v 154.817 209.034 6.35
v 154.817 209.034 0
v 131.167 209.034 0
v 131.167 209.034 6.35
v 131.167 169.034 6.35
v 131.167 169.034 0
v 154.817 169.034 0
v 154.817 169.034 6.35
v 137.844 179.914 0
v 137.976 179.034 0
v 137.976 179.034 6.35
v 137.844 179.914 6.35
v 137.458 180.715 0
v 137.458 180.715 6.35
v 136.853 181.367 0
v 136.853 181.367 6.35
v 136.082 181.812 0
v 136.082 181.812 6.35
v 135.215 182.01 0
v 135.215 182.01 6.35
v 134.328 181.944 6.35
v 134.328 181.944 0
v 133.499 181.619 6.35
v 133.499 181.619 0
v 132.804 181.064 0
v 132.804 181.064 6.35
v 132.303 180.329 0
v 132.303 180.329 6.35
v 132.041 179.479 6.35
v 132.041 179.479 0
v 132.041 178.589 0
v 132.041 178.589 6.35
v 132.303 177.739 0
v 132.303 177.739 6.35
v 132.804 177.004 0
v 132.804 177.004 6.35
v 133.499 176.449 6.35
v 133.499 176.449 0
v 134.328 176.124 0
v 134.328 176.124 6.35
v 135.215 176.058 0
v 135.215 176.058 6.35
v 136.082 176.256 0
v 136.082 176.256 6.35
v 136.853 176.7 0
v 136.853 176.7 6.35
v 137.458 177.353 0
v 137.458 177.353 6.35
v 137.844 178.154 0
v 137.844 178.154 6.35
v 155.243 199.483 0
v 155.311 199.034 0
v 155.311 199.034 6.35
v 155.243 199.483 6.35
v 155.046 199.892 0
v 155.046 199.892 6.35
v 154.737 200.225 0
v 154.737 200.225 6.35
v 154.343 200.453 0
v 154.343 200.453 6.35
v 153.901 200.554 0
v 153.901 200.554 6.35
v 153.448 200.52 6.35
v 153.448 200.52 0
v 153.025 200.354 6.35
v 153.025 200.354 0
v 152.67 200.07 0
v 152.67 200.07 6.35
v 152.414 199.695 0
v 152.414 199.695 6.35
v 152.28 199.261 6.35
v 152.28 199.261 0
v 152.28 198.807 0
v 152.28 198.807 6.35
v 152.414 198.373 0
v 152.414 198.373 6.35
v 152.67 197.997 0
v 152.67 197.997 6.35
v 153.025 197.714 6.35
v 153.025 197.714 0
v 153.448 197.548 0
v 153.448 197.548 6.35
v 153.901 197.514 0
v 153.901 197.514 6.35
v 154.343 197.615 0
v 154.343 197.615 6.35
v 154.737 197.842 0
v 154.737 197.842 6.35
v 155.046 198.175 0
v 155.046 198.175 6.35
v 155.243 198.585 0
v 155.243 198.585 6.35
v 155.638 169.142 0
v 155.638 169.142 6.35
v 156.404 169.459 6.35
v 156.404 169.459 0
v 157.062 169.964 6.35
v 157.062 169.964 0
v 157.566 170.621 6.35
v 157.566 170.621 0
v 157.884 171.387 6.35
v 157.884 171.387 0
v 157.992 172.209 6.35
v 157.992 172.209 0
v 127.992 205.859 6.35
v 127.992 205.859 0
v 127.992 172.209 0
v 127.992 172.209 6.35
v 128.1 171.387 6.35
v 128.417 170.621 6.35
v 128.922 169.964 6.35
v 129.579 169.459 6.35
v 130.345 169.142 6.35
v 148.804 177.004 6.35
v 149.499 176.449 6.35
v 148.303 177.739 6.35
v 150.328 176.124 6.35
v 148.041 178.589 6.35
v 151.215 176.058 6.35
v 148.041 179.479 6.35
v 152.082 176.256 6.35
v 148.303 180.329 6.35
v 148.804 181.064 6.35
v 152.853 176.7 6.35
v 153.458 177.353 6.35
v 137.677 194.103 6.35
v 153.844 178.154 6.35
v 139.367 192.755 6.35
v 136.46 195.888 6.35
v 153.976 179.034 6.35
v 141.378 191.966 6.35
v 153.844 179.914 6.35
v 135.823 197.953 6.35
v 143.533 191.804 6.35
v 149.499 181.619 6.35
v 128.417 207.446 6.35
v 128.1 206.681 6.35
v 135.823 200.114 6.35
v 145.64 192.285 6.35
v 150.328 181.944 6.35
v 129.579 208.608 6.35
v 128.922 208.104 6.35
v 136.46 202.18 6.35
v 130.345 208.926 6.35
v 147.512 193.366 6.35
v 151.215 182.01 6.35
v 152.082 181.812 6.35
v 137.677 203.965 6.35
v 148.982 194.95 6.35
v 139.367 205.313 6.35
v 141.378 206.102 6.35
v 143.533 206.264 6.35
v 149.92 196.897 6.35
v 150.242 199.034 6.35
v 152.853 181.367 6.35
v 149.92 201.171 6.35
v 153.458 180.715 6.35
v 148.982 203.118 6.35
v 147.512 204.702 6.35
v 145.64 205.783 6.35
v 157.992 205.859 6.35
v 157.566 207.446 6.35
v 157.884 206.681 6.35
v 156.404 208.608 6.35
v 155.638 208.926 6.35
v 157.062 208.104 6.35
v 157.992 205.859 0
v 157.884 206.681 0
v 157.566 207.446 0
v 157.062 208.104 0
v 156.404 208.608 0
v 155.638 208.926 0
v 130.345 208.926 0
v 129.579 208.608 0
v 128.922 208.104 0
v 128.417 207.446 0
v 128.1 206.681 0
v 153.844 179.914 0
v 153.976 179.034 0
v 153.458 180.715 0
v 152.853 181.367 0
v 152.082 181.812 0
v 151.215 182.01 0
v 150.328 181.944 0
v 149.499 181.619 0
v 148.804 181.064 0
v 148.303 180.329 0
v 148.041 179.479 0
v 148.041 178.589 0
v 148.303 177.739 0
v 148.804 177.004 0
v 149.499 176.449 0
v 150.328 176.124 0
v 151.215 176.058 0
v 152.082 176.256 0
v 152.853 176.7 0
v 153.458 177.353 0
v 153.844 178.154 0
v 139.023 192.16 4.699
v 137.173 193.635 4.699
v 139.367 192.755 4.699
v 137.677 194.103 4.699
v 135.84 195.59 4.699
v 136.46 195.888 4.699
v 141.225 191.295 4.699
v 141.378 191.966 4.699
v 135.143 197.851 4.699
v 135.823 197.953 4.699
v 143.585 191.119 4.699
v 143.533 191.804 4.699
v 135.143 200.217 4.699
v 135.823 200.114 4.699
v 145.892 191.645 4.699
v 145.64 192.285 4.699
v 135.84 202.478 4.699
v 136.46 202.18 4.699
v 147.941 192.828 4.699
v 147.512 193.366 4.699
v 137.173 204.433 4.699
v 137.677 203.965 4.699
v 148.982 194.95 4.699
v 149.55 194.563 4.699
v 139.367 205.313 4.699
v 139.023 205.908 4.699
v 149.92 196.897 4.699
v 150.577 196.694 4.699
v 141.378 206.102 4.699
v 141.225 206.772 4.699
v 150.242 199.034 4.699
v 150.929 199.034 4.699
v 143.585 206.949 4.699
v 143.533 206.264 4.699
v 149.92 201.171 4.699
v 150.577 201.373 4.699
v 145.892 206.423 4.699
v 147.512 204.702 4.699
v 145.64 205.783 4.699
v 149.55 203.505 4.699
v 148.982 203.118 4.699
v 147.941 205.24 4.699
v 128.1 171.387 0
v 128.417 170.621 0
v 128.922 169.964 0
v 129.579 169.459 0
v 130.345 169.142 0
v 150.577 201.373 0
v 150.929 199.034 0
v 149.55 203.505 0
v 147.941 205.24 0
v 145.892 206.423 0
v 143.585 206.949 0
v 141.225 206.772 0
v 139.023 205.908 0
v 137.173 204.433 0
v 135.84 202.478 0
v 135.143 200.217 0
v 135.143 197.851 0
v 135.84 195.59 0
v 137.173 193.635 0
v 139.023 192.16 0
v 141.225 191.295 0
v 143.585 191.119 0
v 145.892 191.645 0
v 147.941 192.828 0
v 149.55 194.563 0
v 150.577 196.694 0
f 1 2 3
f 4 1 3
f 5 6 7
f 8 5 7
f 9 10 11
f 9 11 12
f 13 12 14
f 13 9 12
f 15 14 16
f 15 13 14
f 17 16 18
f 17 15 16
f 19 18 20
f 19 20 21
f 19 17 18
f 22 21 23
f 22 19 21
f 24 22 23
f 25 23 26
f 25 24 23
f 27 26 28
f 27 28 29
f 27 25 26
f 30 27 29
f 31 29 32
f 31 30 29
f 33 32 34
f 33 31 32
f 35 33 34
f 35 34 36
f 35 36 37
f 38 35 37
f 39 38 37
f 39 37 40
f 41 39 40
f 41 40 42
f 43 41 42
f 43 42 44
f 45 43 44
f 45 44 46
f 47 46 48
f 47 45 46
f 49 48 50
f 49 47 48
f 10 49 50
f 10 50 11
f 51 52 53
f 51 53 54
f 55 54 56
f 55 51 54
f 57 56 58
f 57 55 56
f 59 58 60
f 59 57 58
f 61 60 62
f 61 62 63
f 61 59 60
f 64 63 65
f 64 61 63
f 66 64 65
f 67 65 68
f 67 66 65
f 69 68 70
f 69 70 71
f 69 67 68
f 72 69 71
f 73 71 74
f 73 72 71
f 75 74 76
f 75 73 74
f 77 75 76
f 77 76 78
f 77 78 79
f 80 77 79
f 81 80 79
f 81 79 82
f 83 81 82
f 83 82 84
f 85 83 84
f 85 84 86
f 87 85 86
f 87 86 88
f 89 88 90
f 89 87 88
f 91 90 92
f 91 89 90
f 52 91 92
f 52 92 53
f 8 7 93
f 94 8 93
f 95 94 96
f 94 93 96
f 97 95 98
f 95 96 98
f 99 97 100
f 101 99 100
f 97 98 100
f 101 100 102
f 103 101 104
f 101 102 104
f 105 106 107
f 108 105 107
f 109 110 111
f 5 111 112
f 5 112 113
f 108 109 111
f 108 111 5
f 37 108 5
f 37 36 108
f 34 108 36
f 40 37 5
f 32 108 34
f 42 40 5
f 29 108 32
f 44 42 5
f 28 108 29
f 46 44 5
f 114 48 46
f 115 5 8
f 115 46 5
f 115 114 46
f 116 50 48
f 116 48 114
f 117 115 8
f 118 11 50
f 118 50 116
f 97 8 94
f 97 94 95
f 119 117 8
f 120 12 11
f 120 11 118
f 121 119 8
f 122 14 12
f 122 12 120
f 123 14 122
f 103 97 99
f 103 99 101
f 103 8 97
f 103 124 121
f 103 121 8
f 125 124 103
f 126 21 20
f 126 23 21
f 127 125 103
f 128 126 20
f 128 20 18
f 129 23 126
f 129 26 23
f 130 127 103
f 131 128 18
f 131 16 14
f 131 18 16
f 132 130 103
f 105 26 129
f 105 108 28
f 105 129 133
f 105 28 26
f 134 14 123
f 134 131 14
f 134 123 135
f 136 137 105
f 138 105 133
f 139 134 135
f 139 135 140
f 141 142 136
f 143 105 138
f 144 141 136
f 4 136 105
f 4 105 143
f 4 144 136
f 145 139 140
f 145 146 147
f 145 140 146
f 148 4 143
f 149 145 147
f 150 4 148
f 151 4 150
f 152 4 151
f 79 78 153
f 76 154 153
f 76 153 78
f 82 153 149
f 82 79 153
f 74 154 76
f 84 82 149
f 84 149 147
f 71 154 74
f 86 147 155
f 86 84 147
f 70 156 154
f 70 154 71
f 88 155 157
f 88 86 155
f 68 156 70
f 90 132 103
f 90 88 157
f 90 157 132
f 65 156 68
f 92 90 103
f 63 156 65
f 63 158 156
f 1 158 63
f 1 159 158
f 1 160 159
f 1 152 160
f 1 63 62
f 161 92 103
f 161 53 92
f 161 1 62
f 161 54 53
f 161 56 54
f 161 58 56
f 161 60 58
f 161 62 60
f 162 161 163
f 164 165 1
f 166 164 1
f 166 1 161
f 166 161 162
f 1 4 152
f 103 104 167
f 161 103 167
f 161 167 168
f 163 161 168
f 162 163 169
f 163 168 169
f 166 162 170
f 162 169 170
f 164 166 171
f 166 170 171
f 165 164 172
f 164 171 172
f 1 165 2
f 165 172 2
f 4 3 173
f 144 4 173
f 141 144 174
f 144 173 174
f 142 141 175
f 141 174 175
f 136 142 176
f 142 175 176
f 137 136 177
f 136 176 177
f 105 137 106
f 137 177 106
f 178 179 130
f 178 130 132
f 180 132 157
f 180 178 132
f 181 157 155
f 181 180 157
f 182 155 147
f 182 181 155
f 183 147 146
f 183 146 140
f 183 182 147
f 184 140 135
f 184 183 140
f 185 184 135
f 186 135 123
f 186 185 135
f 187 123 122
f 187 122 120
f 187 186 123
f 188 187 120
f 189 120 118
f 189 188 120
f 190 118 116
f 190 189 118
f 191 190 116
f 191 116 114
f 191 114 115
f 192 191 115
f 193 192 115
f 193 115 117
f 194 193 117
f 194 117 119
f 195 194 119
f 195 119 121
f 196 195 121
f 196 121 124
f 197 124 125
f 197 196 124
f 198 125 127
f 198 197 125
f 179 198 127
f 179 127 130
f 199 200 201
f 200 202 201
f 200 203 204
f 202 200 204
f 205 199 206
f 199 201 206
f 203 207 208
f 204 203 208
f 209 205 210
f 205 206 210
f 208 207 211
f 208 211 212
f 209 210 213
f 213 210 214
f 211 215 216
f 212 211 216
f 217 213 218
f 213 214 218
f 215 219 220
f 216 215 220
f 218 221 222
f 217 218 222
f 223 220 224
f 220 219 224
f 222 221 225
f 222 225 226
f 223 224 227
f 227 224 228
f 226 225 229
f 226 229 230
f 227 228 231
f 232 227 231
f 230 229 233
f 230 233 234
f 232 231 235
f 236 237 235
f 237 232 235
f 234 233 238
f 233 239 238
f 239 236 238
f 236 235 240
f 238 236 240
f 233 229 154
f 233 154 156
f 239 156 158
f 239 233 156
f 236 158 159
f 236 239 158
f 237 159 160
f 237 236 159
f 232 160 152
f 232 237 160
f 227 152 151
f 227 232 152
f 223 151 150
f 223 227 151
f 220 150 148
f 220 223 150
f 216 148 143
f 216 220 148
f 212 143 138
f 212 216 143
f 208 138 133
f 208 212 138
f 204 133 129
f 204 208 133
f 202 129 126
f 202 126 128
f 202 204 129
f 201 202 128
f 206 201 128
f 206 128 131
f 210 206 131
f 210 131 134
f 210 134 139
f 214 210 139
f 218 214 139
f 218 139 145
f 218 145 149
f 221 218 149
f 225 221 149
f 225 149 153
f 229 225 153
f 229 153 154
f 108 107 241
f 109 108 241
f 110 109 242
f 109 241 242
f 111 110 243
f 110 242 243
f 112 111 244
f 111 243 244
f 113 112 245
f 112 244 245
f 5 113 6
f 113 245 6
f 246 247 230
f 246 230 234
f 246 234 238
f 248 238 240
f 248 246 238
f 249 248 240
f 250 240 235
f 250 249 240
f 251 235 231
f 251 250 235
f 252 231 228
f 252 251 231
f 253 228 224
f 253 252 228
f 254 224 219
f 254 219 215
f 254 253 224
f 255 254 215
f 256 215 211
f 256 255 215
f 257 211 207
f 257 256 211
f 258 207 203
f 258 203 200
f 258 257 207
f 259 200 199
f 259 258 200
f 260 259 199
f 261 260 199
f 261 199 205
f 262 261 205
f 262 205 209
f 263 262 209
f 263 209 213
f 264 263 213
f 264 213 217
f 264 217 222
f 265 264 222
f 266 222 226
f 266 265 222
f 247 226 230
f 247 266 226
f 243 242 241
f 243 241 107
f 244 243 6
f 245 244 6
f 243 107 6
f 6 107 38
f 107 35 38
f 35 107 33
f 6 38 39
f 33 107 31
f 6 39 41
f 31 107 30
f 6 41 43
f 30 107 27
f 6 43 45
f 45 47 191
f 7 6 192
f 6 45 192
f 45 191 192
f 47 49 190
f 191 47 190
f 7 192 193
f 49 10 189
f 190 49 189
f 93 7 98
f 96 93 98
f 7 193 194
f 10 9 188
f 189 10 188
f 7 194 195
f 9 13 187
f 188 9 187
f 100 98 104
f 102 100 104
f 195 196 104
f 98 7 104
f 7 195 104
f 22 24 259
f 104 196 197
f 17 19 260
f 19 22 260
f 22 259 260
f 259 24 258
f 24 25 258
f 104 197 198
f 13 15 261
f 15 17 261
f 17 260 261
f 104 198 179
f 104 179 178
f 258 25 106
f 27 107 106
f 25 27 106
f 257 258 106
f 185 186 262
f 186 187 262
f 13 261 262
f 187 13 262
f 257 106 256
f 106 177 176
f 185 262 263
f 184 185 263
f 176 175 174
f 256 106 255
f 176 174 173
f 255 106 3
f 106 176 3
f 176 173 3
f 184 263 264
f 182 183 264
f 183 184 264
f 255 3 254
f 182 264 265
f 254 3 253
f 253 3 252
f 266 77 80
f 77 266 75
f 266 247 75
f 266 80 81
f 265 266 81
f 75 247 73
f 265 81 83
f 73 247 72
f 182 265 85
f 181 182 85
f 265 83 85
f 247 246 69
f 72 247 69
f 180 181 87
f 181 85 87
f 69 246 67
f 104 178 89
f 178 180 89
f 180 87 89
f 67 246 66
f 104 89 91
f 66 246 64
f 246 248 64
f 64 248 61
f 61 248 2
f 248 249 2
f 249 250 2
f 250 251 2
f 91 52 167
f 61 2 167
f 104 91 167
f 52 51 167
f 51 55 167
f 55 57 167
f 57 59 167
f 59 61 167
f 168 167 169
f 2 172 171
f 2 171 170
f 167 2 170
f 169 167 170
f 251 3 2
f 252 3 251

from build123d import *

# Parameters (mm, degrees)
SKETCH1_R           = 2.9845
SKETCH1_R_2         = 1.524
SKETCH1_R_3         = 7.250000001
BOSS_EXTRUDE1_DEPTH = 6.35
SKETCH1_3_R         = 7.9375
SKETCH1_3_R_2       = 7.250000001
CUT_EXTRUDE1_DEPTH  = 4.699


with BuildPart() as part:
    # Sketch1 → Boss-Extrude1 (new body)
    with BuildSketch(Plane.XY):
        with BuildLine():
            ThreePointArc((131.166701588, 209.033854223), (128.921637558, 208.103918253), (127.991701588, 205.858854223))
            Line((127.991701588, 205.858854223), (127.991701588, 172.208854223))
            ThreePointArc((127.991701588, 172.208854223), (128.921637558, 169.963790192), (131.166701588, 169.033854223))
            Line((131.166701588, 169.033854223), (154.816701588, 169.033854223))
            ThreePointArc((154.816701588, 169.033854223), (157.061765618, 169.963790192), (157.991701588, 172.208854223))
            Line((157.991701588, 172.208854223), (157.991701588, 205.858854223))
            ThreePointArc((157.991701588, 205.858854223), (157.061765618, 208.103918253), (154.816701588, 209.033854223))
            Line((154.816701588, 209.033854223), (131.166701588, 209.033854223))
        make_face()
        with Locations((134.991701588, 179.033854223)):
            Circle(SKETCH1_R, mode=Mode.SUBTRACT)
        with Locations((150.991701587, 179.033854223)):
            Circle(SKETCH1_R, mode=Mode.SUBTRACT)
        with Locations((153.786701588, 199.033854223)):
            Circle(SKETCH1_R_2, mode=Mode.SUBTRACT)
        with Locations((142.991701588, 199.033854223)):
            Circle(SKETCH1_R_3, mode=Mode.SUBTRACT)
    extrude(amount=BOSS_EXTRUDE1_DEPTH)

    # Sketch1<3> → Cut-Extrude1 (cut)
    with BuildSketch(Plane.XY):
        with Locations((142.991701588, 199.033854223)):
            Circle(SKETCH1_3_R)
        with Locations((142.991701588, 199.033854223)):
            Circle(SKETCH1_3_R_2, mode=Mode.SUBTRACT)
    extrude(amount=CUT_EXTRUDE1_DEPTH, mode=Mode.SUBTRACT)


solid = part.part
